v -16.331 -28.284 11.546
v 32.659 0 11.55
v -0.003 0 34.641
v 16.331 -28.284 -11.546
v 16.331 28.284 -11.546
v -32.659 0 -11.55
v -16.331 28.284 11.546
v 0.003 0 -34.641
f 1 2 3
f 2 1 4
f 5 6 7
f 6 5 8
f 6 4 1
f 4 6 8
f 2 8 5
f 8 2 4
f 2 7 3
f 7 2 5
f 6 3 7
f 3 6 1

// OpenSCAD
size = 40;
rot = [45,35.26,0];
rotate(rot) cube([size,size,size],center=true);
